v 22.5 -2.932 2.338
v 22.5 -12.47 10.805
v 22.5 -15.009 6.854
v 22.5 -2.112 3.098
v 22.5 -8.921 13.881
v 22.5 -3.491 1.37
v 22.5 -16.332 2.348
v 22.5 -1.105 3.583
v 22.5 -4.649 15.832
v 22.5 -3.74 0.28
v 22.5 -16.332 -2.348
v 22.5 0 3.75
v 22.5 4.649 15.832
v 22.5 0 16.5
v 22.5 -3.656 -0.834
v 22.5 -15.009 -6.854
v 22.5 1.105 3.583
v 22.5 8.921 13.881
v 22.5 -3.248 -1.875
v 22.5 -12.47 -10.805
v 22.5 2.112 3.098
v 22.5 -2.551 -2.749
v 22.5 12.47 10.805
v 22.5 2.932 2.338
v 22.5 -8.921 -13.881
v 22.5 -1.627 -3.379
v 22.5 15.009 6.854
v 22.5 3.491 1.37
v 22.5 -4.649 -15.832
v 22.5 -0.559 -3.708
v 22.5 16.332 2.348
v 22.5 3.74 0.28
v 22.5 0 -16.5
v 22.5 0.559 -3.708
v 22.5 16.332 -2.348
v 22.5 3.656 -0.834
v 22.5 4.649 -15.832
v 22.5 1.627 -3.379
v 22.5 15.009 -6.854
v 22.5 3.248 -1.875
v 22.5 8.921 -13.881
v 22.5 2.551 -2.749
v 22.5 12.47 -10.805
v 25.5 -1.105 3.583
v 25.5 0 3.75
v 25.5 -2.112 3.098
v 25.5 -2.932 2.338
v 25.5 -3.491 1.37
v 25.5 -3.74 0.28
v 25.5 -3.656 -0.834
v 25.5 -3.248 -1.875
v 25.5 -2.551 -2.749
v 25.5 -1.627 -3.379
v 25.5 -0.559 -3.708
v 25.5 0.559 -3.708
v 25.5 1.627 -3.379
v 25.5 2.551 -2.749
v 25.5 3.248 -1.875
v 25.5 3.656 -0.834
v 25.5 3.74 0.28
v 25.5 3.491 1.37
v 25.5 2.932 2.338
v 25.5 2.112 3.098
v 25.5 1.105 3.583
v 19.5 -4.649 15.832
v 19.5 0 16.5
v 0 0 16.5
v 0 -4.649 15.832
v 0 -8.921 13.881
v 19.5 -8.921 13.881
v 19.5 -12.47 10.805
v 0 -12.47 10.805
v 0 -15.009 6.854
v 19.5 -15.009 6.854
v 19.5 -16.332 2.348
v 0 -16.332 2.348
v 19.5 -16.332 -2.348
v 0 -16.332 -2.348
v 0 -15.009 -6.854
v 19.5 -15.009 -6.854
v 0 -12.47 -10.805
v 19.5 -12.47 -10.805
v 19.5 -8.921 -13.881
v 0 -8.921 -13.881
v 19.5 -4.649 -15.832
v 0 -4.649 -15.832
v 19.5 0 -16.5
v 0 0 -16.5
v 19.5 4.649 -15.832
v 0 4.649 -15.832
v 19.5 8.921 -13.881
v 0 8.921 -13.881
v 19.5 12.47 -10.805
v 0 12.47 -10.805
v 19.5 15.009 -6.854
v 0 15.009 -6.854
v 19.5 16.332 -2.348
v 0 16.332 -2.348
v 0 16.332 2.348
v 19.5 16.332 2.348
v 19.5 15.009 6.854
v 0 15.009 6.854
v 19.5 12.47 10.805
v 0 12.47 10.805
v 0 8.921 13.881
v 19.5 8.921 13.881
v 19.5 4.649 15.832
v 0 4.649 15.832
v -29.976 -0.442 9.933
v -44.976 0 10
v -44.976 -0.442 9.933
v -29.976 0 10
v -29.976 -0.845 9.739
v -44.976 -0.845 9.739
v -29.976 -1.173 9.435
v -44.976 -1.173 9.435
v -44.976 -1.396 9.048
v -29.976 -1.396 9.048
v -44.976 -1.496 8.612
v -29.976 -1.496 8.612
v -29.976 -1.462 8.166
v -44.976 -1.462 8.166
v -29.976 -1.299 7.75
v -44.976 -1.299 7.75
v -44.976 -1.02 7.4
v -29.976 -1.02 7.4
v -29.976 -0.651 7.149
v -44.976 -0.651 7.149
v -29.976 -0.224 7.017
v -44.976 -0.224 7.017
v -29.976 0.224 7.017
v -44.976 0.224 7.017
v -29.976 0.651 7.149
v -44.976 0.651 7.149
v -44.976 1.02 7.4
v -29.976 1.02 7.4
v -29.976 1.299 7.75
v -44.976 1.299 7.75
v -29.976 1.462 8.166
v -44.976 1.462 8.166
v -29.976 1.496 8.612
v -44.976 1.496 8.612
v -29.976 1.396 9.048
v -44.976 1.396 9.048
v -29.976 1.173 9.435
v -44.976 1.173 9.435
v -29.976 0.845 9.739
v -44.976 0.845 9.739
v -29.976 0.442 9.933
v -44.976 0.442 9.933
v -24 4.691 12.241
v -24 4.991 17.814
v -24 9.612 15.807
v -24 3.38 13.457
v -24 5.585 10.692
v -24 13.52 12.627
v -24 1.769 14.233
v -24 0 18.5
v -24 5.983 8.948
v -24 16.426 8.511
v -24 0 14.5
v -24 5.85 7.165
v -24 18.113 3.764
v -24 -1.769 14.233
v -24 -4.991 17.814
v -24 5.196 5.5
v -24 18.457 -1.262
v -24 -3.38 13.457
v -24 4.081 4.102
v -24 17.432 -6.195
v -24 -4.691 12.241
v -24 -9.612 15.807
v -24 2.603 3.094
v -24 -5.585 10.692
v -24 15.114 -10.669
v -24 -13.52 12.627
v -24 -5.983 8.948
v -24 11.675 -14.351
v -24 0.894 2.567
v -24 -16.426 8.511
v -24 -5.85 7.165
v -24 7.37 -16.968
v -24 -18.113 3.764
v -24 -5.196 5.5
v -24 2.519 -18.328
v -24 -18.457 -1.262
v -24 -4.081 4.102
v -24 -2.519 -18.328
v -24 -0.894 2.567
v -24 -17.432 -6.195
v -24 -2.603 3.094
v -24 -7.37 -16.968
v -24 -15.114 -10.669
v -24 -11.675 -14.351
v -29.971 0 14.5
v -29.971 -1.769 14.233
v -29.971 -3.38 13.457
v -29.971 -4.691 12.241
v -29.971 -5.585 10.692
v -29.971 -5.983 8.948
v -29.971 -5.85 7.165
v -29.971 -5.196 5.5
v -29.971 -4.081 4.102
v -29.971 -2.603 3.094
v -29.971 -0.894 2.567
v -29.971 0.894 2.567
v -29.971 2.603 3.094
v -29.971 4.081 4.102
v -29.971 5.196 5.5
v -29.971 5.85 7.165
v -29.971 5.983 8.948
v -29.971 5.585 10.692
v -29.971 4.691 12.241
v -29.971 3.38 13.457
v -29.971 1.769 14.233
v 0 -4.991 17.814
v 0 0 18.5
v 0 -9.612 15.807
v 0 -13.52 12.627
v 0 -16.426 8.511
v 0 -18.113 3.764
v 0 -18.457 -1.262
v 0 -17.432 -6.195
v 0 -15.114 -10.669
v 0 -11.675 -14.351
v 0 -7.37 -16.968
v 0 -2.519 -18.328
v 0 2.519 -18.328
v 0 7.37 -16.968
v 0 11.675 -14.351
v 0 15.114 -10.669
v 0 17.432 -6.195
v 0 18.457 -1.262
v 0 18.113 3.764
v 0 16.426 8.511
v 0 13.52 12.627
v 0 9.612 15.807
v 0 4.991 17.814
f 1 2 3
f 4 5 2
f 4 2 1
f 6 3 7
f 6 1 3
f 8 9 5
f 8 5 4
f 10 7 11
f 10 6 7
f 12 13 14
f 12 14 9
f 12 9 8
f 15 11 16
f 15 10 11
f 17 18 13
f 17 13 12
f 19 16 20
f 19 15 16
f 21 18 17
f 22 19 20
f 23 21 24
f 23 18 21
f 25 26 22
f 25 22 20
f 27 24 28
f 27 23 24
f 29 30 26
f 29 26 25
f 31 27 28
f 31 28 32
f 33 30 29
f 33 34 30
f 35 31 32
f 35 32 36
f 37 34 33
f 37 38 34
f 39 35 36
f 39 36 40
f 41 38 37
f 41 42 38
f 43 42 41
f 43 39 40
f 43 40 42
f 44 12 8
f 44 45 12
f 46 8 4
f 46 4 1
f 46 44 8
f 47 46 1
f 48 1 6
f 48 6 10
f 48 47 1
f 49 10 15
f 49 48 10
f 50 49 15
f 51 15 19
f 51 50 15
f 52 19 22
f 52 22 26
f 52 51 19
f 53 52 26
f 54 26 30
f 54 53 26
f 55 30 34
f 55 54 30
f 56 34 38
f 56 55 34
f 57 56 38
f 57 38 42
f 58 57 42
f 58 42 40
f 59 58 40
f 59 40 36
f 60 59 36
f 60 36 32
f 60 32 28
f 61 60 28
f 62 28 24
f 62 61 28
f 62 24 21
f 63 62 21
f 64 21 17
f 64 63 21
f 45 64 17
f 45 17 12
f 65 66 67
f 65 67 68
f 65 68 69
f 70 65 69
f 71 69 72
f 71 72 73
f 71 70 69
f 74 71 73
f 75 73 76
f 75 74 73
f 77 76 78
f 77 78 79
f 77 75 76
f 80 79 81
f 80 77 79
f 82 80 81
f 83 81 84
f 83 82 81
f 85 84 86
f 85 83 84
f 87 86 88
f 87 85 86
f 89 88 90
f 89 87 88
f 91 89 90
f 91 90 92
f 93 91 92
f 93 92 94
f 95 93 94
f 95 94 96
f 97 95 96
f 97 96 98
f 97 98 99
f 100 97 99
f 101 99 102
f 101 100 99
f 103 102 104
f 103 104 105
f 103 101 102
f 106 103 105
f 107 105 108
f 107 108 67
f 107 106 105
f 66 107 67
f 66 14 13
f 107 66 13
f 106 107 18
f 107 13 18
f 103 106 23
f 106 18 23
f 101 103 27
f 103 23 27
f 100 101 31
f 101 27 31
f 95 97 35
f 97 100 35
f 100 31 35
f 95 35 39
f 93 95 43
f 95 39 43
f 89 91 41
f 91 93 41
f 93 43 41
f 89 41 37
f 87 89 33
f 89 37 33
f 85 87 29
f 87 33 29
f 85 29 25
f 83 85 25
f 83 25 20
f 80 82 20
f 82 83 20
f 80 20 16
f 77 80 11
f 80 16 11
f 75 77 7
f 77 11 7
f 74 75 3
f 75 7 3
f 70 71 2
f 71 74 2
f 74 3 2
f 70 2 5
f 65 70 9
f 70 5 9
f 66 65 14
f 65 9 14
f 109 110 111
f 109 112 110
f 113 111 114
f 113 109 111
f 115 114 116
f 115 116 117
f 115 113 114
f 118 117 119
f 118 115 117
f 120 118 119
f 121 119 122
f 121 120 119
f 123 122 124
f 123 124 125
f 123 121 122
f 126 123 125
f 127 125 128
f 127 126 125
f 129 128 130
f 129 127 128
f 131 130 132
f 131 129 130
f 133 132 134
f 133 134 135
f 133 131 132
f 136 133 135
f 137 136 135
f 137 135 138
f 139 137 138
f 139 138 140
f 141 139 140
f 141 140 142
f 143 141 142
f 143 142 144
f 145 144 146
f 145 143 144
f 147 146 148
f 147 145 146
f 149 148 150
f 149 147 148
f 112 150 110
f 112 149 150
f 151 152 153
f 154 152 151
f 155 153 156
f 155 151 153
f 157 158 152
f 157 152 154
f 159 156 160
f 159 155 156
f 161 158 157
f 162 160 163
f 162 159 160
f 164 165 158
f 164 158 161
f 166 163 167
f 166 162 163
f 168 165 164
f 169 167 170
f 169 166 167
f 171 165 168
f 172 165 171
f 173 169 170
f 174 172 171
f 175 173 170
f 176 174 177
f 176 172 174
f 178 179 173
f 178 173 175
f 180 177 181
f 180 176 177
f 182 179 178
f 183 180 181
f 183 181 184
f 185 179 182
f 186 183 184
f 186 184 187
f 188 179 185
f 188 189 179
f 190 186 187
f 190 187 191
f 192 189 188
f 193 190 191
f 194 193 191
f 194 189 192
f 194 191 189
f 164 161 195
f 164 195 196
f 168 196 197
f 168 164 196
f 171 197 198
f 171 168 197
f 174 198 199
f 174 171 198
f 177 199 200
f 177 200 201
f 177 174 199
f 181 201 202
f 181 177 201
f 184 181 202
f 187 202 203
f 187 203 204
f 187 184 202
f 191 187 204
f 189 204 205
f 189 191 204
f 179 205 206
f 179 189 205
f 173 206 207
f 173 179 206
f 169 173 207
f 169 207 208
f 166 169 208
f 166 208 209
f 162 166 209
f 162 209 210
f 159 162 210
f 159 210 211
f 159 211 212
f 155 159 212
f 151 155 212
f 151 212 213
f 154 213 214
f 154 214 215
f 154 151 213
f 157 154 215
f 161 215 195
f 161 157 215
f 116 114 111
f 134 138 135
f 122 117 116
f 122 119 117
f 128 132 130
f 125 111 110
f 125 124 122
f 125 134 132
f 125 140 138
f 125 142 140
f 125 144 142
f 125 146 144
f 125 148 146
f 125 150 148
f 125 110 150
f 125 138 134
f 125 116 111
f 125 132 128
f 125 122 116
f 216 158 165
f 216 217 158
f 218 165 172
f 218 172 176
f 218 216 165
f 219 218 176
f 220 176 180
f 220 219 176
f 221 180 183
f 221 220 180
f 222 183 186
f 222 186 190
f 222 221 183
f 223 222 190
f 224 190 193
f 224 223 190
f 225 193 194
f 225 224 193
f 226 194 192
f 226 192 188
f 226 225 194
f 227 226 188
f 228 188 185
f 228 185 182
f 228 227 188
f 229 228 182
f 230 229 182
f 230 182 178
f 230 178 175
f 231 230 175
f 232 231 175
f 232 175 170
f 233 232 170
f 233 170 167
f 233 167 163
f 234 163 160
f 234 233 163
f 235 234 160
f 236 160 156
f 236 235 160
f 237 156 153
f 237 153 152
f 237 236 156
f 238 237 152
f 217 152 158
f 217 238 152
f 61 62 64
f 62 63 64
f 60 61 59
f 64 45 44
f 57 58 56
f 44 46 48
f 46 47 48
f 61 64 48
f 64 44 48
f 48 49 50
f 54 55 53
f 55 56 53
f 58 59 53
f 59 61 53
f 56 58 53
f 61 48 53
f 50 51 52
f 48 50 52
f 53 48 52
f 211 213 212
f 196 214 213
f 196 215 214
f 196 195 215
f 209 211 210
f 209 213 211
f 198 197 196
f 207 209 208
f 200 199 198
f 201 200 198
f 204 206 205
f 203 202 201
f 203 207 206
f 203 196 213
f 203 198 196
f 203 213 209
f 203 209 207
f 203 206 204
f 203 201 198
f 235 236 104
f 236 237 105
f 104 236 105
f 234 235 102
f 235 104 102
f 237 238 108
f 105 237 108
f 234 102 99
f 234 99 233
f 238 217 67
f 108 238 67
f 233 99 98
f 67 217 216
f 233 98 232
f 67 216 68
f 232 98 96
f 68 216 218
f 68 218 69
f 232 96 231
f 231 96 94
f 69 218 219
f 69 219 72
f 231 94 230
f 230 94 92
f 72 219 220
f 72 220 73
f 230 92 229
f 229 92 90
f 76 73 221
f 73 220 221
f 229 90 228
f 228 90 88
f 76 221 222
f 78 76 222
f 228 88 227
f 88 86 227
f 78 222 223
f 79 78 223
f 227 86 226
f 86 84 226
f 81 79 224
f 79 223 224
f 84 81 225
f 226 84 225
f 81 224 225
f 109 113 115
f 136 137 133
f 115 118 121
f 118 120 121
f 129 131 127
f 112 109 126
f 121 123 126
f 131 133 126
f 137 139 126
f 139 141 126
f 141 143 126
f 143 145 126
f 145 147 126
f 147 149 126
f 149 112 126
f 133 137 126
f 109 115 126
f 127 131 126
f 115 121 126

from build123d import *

# Parameters (mm, degrees)
F0_W  = 24
F0_H  = 18.5
F2_W  = 19.5
F2_H  = 16.5
F4_W  = 3
F4_H  = 16.5
F6_W  = 3
F6_H  = 3.75
F8_W  = 6
F8_H  = 6
F10_W = 15
F10_H = 1.5


with BuildPart() as f1:
    # F0 (on Front) → F1 (revolve)
    with BuildSketch(Plane.XZ):
        with Locations((-12, 9.25)):
            Rectangle(F0_W, F0_H)
    revolve(axis=Axis((-10.174999, 0, 0), (1, 0, 0)))

    # F2 (on Front) → F3 (revolve)
    with BuildSketch(Plane.XZ):
        with Locations((9.75, 8.25)):
            Rectangle(F2_W, F2_H)
    revolve(axis=Axis((4.448437, 0, 0), (1, 0, 0)))

    # F4 (on Front) → F5 (revolve)
    with BuildSketch(Plane.XZ):
        with Locations((21, 8.25)):
            Rectangle(F4_W, F4_H)
    revolve(axis=Axis((22.131725, 0, 0), (-1, 0, 0)))

    # F6 (on Front) → F7 (revolve)
    with BuildSketch(Plane.XZ):
        with Locations((24, 1.875)):
            Rectangle(F6_W, F6_H)
    revolve(axis=Axis((1.009684, 0, 0), (1, 0, 0)))

    # F8 (on Front) → F9 (revolve)
    with BuildSketch(Plane.XZ):
        with Locations((-26.971126, 11.5)):
            Rectangle(F8_W, F8_H)
    revolve(axis=Axis((-6.492025, 0, 8.5), (1, 0, 0)))


with BuildPart() as f11:
    # F10 (on Front) → F11 (revolve)
    with BuildSketch(Plane.XZ):
        with Locations((-37.476428, 9.25)):
            Rectangle(F10_W, F10_H)
    revolve(axis=Axis((-12.539559, 0, 8.5), (1, 0, 0)))


solid = Compound([f1.part, f11.part])
